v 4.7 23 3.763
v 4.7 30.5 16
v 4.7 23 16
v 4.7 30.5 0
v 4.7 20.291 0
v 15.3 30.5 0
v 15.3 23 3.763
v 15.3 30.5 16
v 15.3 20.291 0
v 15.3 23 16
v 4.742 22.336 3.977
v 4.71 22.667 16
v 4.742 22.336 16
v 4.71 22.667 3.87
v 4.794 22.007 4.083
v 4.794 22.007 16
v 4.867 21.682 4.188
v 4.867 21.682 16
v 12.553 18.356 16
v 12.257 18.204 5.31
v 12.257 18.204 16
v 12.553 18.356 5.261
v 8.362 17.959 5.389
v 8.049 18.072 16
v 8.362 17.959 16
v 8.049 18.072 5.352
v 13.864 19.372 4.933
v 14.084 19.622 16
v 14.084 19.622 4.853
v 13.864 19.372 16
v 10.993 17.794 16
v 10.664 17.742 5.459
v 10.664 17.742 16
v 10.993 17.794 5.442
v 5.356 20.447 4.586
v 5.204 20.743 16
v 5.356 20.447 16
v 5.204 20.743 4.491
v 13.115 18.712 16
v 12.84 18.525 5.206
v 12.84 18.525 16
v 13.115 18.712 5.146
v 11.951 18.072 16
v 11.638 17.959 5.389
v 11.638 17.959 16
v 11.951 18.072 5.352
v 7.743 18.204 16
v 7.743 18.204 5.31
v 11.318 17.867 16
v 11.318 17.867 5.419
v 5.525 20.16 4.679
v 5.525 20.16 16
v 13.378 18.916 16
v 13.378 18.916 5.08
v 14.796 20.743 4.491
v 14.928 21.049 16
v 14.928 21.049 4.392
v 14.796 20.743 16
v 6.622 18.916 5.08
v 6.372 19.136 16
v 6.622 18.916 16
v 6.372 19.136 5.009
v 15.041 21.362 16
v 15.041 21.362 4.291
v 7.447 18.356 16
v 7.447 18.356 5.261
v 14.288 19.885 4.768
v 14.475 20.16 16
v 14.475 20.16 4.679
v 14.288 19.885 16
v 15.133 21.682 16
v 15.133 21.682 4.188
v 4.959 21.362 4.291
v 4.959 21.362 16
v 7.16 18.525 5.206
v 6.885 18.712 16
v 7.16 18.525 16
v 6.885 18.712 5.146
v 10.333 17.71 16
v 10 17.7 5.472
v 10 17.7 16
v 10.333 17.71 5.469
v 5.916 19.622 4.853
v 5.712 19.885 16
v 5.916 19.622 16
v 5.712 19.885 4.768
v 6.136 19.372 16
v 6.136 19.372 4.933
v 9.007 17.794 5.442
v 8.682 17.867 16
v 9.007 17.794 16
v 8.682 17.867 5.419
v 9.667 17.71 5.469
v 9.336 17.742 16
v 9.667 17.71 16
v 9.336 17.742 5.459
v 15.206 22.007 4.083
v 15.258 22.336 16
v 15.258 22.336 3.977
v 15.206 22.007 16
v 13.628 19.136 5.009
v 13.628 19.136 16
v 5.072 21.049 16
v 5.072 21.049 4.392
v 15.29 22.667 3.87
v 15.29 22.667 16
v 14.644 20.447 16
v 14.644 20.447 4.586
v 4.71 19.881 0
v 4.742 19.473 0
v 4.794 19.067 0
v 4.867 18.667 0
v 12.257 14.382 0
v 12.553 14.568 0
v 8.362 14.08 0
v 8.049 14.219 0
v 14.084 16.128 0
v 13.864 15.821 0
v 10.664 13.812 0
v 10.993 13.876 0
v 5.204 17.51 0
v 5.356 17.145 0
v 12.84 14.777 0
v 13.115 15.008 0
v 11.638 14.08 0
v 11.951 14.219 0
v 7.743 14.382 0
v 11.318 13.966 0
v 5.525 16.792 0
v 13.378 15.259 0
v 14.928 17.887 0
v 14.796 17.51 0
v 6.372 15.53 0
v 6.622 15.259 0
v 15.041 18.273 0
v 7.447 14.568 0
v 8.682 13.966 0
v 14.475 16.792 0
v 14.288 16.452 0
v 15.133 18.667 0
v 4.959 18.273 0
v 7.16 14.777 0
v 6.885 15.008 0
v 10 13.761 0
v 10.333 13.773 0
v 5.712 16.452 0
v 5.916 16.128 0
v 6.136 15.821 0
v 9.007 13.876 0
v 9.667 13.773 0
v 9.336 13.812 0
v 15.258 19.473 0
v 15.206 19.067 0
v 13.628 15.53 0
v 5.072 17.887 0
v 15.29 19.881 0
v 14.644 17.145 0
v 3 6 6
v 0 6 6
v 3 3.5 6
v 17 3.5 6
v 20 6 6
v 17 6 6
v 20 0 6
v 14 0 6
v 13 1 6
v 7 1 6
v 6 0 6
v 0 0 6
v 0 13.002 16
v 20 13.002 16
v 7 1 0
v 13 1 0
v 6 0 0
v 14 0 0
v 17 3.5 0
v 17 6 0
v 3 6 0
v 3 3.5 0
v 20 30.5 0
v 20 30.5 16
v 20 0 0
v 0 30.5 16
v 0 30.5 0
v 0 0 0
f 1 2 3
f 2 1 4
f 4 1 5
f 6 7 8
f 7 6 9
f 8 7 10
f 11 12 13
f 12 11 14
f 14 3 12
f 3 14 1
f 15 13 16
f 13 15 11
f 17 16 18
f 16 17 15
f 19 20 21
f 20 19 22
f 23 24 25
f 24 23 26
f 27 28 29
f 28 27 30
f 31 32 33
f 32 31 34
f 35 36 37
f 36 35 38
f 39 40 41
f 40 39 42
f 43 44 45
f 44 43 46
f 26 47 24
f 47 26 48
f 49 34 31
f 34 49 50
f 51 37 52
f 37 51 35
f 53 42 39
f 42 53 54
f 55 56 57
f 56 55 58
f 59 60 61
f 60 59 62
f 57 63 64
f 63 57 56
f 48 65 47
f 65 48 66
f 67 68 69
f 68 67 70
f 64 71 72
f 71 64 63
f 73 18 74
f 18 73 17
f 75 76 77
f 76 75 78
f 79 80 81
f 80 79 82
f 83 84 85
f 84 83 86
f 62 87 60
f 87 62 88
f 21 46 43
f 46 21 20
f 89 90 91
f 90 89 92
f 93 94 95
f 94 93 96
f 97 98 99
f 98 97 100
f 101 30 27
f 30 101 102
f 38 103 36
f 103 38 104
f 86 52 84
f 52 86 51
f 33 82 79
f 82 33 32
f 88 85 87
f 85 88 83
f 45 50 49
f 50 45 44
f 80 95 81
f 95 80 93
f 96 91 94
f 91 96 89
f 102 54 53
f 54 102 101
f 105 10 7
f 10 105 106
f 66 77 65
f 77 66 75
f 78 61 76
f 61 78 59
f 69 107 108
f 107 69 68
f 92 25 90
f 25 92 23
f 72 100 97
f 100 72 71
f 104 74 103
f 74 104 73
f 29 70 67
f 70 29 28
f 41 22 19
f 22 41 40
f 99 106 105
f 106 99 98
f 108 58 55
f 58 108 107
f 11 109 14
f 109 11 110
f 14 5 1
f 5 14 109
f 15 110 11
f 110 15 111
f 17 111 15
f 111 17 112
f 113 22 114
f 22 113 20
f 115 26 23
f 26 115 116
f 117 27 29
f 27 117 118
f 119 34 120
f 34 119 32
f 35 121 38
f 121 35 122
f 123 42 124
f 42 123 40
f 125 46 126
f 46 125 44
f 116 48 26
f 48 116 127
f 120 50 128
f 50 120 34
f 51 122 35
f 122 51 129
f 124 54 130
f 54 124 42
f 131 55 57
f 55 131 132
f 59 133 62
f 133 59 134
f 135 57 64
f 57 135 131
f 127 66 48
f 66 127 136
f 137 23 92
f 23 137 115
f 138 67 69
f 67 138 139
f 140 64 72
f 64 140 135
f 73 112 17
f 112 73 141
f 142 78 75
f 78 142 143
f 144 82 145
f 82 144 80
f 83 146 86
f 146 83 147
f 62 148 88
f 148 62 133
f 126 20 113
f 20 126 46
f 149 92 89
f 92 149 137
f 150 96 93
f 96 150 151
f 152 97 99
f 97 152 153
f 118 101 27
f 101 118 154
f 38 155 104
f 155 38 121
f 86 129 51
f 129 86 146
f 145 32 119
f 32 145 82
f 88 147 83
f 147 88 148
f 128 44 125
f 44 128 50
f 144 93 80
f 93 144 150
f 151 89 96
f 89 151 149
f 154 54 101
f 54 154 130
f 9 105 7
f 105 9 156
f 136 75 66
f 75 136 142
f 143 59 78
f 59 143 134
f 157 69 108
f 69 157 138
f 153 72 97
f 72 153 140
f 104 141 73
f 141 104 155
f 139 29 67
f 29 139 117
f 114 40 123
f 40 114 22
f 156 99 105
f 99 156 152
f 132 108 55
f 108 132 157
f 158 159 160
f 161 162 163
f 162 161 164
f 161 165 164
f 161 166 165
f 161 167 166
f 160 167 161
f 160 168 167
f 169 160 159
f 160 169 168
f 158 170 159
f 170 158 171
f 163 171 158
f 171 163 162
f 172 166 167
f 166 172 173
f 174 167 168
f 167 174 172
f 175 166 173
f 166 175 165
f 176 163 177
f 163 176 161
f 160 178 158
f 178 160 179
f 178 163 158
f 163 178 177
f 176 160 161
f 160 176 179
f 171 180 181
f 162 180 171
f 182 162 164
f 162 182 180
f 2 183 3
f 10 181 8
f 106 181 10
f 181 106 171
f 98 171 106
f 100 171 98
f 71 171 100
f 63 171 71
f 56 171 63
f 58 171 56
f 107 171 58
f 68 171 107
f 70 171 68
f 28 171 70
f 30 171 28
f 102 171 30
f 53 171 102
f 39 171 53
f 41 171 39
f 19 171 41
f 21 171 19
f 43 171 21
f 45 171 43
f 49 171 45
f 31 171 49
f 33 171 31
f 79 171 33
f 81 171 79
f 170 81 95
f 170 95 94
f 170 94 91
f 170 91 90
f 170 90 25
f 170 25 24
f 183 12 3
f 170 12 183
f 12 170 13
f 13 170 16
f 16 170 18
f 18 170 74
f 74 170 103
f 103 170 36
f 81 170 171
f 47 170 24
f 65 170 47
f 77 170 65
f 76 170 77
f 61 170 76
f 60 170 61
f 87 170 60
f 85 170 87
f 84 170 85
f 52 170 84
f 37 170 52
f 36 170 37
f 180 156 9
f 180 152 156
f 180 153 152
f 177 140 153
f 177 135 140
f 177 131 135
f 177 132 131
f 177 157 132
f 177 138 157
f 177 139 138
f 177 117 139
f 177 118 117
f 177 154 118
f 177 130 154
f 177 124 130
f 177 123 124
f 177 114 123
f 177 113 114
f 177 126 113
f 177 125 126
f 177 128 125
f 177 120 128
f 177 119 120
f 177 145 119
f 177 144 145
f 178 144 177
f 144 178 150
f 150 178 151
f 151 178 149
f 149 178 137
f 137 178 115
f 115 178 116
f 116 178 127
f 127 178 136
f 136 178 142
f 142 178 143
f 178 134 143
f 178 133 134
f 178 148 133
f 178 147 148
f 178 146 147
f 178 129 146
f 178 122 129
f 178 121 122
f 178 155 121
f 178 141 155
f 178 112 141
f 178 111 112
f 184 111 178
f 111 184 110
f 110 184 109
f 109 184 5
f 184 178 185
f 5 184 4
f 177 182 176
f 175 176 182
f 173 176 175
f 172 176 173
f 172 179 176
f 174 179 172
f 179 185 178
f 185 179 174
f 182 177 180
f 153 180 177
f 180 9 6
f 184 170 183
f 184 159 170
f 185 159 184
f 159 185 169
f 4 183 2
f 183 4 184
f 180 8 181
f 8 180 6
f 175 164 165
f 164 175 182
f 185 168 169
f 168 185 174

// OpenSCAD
// Created from Code_Ycorner (x3).stl
// https://github.com/Mecan0/Code
// By J.Rodigo (www.jra.so)
// Licence Creative commons atribution & share alike.

/**************************/
// Parámetros de la pieza  /
/**************************/

// Diámetro del tornillo (10.6)
dPas = 10.6;	

// Pieza principal a trabajar
module bloque(){
	cube([20, 30.5, 16]);	
}

// Taladro y redondeo en forma de U (Centrado)
// (d,h,u) = (diámetro,altura,largo de vaciado)
module RedU(d,h,u){ 
		// Taladro vertical
		translate([(d/2)+(u-d)/2, 0, 0])
		cube([u, d, h],center=true);
		// Vaciado en forma de U
		translate([0, 0, -h/2])
		rotate( 90, [0, 0, 1])
		cylinder(h = h, r = d/2, $fn=100);
}

// Vaciado en forma de U para el tornillo
module taladro(){
	// Vaciado en forma de U (Vertical)
	translate([10, 23, 8])
	rotate( 90, [0, 0, 1])
	RedU(dPas,17,8);
	// Vaciado en forma de U (Inclinado)
	translate([10, 25.2, 6.819])
	rotate(-35.75, [1,0,0])
	rotate( 90, [0, 0, 1])
	RedU(dPas,25,8);
}

// Vaciado y chaflán
module vaciochaflan(){
	// Vaciado plano
	translate([-1, -1, 6])
	cube([22, 7, 11]);
	// Vaciado chaflán
	translate([-1, 6, 6])
	rotate(55, [1,0,0])
	cube([22, 15, 8]);
}

// Tope para la varilla lisa
module tope(){	
	// Tope de soporte de la varilla lisa
	translate([7, -1, -1])
	cube([6, 2, 8]);
	// Chaflán a 45º
	translate([7, 1, -1])
	rotate(225, [0,0,1])
	cube([2, 2, 8]);
	// Chaflán a 45º
	translate([13, 1, -1])
	rotate(225, [0,0,1])
	cube([2, 2, 8]);
	// Vaciado interior del tope
	translate([3, 3.5, -1])
	cube([14, 2.5, 8]);
}

// Creamos la pieza a partir del bloque y todas sus operaciones
module pieza(){
	// Bloque principal de la pieza
	difference() {
		bloque();
		union() {
			taladro();
			vaciochaflan();
			tope();
		}
	}
}

// Generamos la pieza!!

	pieza();
